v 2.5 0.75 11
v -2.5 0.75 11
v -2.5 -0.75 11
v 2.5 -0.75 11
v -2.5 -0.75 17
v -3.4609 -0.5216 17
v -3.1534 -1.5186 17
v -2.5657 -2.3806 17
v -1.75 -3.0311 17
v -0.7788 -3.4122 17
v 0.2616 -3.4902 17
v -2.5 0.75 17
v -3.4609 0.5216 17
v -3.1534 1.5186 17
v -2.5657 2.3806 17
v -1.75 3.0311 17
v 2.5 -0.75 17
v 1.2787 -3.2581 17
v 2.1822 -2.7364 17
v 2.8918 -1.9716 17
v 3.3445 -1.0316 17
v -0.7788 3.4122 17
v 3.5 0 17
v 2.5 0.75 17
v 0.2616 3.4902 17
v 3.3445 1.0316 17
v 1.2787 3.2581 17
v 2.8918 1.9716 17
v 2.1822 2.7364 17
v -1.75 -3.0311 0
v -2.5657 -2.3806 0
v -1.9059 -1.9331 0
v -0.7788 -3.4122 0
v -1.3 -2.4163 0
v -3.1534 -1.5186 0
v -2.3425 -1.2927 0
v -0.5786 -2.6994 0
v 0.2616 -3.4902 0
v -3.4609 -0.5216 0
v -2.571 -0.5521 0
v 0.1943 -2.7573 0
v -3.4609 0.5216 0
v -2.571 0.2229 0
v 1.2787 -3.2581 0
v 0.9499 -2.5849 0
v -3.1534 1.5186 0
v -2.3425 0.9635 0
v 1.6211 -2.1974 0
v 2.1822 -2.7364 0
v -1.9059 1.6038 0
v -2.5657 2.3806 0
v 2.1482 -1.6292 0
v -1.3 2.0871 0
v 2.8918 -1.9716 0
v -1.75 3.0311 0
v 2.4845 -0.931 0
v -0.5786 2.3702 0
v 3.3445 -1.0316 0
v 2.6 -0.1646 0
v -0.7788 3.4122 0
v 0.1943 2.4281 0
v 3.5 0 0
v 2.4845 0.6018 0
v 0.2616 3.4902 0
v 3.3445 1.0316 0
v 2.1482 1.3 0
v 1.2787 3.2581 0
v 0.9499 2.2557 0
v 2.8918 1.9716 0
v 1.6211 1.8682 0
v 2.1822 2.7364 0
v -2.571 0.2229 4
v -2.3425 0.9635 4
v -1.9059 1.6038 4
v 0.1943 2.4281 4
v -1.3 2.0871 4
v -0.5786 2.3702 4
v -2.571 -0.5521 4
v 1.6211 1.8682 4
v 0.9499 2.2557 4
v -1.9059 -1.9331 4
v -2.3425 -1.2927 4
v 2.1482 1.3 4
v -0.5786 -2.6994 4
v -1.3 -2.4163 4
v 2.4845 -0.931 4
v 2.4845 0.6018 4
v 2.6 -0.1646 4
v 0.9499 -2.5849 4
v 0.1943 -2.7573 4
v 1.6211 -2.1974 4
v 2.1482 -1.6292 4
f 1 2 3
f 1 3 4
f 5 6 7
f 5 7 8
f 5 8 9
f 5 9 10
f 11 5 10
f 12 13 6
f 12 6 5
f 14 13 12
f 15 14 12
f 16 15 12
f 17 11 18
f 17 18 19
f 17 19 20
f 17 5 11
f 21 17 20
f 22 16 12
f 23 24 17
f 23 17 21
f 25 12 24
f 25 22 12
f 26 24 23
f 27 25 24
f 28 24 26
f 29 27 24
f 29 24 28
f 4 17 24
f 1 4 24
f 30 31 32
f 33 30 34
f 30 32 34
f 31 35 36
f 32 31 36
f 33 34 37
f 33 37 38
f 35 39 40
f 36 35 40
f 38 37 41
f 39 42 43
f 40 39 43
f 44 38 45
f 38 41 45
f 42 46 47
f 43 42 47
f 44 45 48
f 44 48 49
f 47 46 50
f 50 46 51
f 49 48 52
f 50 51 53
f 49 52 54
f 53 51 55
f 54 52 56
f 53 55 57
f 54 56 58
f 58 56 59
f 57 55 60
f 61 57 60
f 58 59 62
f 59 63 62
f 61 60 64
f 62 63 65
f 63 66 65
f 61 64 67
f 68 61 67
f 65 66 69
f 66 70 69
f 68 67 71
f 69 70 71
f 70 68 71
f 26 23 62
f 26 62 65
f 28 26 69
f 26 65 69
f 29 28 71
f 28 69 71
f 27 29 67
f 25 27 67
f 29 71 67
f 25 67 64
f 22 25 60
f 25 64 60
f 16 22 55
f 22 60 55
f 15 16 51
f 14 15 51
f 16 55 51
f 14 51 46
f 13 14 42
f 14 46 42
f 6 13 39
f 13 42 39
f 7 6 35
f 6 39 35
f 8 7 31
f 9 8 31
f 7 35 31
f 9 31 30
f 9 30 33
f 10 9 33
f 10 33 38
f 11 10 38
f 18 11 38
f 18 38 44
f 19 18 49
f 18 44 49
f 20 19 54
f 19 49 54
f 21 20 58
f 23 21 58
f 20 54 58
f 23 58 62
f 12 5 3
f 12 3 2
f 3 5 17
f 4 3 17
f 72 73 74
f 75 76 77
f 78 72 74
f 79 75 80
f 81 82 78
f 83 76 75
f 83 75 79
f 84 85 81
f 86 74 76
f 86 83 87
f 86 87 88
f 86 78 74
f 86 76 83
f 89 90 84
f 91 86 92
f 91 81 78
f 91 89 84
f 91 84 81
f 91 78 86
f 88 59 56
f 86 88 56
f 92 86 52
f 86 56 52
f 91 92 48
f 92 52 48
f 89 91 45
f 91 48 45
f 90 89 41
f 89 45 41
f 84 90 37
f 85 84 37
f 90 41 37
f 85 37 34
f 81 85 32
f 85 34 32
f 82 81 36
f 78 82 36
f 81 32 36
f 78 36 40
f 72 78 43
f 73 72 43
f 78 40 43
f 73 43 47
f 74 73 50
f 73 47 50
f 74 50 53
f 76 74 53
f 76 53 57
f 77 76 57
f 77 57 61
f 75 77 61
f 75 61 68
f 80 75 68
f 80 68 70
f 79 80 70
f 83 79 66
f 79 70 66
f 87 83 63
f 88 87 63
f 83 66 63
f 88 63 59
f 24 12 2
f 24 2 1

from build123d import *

# Parameters (mm, degrees)
F0_R     = 3.5
F1_DEPTH = 10
F2_R     = 2.6
F3_DEPTH = 4
F4_DEPTH = 7
F5_W     = 5
F5_H     = 1.5
F6_DEPTH = 6


with BuildPart() as f1:
    # F0 (on Top) → F1 (new body)
    with BuildSketch(Plane.XY):
        Circle(F0_R)
    extrude(amount=F1_DEPTH)

    # F2 (on face) → F3 (cut)
    with BuildSketch(Plane(origin=(0, 0, 0), x_dir=(1, 0, 0), z_dir=(0, 0, -1))):
        with Locations((0, 0.1646061121)):
            Circle(F2_R)
    extrude(amount=-F3_DEPTH, mode=Mode.SUBTRACT)

    # F4 (add): a face of the model
    f4_faces = [f1.faces().sort_by_distance(p)[0] for p in [
        (0, 0, 10),
    ]]
    extrude(f4_faces, amount=F4_DEPTH)

    # F5 (on face) → F6 (cut)
    with BuildSketch(Plane.XY.offset(17)):
        Rectangle(F5_W, F5_H)
    extrude(amount=-F6_DEPTH, mode=Mode.SUBTRACT)


solid = f1.part
